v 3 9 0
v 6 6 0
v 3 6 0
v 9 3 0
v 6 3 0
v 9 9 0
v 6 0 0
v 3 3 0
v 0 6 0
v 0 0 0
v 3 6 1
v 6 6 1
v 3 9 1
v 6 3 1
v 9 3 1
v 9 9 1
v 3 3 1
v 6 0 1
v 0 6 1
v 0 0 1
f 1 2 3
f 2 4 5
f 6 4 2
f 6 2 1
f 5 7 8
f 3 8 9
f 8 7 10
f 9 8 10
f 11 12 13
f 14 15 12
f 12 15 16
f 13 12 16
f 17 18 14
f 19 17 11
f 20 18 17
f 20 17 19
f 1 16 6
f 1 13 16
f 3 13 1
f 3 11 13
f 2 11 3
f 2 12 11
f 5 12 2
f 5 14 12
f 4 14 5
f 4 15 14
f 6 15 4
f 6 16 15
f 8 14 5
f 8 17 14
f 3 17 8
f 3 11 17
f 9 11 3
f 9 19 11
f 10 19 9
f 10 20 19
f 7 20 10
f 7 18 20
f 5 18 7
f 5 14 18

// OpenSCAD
// two overlapping paths: the overlap becomes a hole
linear_extrude(1)
  polygon(points = [[0, 0], [6, 0], [6, 6], [0, 6], [3, 3], [9, 3], [9, 9], [3, 9]],
          paths = [[0, 1, 2, 3], [4, 5, 6, 7]]);
